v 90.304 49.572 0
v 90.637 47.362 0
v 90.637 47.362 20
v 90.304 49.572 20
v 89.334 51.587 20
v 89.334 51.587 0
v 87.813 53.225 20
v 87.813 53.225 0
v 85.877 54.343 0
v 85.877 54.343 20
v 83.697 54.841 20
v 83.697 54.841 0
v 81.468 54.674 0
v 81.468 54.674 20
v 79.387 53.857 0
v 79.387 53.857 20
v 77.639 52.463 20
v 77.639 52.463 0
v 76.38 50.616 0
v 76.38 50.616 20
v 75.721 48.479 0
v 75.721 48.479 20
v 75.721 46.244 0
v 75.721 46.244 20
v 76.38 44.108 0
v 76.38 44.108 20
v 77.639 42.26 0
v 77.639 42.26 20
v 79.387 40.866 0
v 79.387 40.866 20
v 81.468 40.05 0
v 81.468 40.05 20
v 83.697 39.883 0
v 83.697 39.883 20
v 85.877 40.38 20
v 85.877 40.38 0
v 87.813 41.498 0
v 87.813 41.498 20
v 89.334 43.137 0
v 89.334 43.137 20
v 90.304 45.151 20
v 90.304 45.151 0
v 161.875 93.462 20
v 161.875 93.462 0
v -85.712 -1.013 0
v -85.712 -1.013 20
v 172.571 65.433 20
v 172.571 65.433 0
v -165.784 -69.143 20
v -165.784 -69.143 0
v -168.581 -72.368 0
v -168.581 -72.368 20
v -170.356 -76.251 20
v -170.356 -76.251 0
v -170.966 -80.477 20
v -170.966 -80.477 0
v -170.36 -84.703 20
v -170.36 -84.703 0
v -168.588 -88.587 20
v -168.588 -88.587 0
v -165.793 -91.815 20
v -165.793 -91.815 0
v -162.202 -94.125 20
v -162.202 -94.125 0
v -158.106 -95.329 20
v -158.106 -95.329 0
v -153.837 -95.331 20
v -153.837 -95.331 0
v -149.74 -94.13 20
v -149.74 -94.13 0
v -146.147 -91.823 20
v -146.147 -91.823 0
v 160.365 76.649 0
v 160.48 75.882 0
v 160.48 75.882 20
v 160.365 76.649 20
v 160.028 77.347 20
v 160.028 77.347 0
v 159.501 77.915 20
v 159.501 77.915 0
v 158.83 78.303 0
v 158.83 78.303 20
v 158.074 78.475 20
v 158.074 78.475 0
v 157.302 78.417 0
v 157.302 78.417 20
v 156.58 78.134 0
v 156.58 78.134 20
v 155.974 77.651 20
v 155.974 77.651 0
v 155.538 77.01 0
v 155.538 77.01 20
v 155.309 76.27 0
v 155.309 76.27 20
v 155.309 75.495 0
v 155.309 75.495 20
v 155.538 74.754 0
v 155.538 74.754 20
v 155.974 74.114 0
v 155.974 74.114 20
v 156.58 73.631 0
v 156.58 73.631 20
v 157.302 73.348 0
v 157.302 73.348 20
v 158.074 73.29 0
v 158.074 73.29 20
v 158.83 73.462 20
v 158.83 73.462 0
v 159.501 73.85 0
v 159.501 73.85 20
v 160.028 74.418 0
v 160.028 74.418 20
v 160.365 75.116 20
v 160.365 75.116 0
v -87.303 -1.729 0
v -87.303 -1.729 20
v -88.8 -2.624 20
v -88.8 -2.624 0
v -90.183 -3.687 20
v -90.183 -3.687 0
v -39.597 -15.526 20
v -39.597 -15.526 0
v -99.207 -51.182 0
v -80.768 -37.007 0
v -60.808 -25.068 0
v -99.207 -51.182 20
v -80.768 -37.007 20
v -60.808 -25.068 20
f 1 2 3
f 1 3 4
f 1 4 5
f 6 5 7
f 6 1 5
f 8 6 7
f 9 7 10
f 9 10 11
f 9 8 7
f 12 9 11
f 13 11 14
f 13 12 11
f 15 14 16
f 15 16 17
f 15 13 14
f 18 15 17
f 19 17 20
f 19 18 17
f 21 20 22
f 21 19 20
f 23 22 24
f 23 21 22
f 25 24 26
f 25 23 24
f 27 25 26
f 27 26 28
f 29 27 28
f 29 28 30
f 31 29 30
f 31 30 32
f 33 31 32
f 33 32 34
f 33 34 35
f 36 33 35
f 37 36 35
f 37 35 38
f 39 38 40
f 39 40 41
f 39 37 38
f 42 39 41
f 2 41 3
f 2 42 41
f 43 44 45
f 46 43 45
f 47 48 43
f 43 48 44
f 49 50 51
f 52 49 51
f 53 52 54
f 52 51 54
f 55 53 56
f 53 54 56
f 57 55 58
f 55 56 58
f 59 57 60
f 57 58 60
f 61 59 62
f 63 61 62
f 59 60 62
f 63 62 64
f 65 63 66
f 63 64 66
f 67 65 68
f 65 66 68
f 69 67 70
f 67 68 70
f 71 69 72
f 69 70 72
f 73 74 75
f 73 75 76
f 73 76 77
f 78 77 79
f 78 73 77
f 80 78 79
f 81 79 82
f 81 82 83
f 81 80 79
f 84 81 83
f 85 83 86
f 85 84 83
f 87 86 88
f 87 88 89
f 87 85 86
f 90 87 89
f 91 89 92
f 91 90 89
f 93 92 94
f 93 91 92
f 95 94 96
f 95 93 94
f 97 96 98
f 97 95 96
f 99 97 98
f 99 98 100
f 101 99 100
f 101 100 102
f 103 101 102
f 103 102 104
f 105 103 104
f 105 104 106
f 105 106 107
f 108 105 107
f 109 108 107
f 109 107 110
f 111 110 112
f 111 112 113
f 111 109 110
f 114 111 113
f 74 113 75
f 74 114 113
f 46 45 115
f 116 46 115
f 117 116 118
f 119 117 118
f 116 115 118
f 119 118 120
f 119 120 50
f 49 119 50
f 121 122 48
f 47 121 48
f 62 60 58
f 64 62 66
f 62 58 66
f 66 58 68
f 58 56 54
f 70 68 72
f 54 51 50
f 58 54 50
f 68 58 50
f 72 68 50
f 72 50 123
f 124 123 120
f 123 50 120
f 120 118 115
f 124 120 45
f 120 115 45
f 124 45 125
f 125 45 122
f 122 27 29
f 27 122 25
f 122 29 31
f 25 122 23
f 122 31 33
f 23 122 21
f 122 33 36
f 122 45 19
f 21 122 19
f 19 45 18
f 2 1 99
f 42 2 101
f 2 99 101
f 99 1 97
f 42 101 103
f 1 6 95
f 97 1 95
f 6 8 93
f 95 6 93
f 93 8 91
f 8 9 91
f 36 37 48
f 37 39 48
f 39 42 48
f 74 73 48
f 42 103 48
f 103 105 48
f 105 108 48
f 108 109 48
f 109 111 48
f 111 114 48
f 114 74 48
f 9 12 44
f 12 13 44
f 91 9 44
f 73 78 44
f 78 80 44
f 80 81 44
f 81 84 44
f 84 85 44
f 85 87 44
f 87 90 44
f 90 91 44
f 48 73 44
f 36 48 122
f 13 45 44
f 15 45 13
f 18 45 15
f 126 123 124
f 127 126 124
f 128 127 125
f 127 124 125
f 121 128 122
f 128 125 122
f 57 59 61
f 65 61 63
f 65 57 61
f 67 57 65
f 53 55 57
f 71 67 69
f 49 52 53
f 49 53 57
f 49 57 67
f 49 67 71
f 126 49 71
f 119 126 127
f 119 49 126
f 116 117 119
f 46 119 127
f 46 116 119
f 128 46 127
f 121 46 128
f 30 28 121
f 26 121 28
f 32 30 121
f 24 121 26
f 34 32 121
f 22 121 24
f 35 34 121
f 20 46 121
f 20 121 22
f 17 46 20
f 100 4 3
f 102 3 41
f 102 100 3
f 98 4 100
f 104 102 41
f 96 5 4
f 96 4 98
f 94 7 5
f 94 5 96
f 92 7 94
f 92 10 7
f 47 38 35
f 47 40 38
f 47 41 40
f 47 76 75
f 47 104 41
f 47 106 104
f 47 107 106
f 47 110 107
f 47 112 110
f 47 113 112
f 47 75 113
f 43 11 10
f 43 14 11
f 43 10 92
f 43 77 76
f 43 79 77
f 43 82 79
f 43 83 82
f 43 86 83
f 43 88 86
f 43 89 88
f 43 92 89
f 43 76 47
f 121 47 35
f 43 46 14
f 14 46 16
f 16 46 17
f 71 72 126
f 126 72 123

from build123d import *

# Parameters (mm, degrees)
SKETCH_1_R      = 2.6
SKETCH_1_R_2    = 7.5
EXTRUDE_1_DEPTH = 20


with BuildPart() as part:
    # 草图1 → 凸台-拉伸1 (new body)
    with BuildSketch(Plane.XY):
        with BuildLine():
            Line((-90.182622834, -3.687217222), (-165.784023014, -69.142761608))
            ThreePointArc((-165.784023014, -69.142761608), (-167.305901383, -90.301303292), (-146.147359698, -91.823181662))
            Line((-146.147359698, -91.823181662), (-99.206677775, -51.182031077))
            ThreePointArc((-99.206677775, -51.182031077), (-70.96175344, -30.746669364), (-39.59736965, -15.526446352))
            Line((-39.59736965, -15.526446352), (172.570702611, 65.433053226))
            Line((172.570702611, 65.433053226), (161.875435514, 93.461810989))
            Line((161.875435514, 93.461810989), (-85.711924724, -1.013048368))
            ThreePointArc((-85.711924724, -1.013048368), (-88.064253508, -2.154565094), (-90.182622834, -3.687217222))
        make_face()
        with Locations((157.880149808, 75.882343075)):
            Circle(SKETCH_1_R, mode=Mode.SUBTRACT)
        with Locations((83.136795774, 47.361630817)):
            Circle(SKETCH_1_R_2, mode=Mode.SUBTRACT)
    extrude(amount=EXTRUDE_1_DEPTH)


solid = part.part
